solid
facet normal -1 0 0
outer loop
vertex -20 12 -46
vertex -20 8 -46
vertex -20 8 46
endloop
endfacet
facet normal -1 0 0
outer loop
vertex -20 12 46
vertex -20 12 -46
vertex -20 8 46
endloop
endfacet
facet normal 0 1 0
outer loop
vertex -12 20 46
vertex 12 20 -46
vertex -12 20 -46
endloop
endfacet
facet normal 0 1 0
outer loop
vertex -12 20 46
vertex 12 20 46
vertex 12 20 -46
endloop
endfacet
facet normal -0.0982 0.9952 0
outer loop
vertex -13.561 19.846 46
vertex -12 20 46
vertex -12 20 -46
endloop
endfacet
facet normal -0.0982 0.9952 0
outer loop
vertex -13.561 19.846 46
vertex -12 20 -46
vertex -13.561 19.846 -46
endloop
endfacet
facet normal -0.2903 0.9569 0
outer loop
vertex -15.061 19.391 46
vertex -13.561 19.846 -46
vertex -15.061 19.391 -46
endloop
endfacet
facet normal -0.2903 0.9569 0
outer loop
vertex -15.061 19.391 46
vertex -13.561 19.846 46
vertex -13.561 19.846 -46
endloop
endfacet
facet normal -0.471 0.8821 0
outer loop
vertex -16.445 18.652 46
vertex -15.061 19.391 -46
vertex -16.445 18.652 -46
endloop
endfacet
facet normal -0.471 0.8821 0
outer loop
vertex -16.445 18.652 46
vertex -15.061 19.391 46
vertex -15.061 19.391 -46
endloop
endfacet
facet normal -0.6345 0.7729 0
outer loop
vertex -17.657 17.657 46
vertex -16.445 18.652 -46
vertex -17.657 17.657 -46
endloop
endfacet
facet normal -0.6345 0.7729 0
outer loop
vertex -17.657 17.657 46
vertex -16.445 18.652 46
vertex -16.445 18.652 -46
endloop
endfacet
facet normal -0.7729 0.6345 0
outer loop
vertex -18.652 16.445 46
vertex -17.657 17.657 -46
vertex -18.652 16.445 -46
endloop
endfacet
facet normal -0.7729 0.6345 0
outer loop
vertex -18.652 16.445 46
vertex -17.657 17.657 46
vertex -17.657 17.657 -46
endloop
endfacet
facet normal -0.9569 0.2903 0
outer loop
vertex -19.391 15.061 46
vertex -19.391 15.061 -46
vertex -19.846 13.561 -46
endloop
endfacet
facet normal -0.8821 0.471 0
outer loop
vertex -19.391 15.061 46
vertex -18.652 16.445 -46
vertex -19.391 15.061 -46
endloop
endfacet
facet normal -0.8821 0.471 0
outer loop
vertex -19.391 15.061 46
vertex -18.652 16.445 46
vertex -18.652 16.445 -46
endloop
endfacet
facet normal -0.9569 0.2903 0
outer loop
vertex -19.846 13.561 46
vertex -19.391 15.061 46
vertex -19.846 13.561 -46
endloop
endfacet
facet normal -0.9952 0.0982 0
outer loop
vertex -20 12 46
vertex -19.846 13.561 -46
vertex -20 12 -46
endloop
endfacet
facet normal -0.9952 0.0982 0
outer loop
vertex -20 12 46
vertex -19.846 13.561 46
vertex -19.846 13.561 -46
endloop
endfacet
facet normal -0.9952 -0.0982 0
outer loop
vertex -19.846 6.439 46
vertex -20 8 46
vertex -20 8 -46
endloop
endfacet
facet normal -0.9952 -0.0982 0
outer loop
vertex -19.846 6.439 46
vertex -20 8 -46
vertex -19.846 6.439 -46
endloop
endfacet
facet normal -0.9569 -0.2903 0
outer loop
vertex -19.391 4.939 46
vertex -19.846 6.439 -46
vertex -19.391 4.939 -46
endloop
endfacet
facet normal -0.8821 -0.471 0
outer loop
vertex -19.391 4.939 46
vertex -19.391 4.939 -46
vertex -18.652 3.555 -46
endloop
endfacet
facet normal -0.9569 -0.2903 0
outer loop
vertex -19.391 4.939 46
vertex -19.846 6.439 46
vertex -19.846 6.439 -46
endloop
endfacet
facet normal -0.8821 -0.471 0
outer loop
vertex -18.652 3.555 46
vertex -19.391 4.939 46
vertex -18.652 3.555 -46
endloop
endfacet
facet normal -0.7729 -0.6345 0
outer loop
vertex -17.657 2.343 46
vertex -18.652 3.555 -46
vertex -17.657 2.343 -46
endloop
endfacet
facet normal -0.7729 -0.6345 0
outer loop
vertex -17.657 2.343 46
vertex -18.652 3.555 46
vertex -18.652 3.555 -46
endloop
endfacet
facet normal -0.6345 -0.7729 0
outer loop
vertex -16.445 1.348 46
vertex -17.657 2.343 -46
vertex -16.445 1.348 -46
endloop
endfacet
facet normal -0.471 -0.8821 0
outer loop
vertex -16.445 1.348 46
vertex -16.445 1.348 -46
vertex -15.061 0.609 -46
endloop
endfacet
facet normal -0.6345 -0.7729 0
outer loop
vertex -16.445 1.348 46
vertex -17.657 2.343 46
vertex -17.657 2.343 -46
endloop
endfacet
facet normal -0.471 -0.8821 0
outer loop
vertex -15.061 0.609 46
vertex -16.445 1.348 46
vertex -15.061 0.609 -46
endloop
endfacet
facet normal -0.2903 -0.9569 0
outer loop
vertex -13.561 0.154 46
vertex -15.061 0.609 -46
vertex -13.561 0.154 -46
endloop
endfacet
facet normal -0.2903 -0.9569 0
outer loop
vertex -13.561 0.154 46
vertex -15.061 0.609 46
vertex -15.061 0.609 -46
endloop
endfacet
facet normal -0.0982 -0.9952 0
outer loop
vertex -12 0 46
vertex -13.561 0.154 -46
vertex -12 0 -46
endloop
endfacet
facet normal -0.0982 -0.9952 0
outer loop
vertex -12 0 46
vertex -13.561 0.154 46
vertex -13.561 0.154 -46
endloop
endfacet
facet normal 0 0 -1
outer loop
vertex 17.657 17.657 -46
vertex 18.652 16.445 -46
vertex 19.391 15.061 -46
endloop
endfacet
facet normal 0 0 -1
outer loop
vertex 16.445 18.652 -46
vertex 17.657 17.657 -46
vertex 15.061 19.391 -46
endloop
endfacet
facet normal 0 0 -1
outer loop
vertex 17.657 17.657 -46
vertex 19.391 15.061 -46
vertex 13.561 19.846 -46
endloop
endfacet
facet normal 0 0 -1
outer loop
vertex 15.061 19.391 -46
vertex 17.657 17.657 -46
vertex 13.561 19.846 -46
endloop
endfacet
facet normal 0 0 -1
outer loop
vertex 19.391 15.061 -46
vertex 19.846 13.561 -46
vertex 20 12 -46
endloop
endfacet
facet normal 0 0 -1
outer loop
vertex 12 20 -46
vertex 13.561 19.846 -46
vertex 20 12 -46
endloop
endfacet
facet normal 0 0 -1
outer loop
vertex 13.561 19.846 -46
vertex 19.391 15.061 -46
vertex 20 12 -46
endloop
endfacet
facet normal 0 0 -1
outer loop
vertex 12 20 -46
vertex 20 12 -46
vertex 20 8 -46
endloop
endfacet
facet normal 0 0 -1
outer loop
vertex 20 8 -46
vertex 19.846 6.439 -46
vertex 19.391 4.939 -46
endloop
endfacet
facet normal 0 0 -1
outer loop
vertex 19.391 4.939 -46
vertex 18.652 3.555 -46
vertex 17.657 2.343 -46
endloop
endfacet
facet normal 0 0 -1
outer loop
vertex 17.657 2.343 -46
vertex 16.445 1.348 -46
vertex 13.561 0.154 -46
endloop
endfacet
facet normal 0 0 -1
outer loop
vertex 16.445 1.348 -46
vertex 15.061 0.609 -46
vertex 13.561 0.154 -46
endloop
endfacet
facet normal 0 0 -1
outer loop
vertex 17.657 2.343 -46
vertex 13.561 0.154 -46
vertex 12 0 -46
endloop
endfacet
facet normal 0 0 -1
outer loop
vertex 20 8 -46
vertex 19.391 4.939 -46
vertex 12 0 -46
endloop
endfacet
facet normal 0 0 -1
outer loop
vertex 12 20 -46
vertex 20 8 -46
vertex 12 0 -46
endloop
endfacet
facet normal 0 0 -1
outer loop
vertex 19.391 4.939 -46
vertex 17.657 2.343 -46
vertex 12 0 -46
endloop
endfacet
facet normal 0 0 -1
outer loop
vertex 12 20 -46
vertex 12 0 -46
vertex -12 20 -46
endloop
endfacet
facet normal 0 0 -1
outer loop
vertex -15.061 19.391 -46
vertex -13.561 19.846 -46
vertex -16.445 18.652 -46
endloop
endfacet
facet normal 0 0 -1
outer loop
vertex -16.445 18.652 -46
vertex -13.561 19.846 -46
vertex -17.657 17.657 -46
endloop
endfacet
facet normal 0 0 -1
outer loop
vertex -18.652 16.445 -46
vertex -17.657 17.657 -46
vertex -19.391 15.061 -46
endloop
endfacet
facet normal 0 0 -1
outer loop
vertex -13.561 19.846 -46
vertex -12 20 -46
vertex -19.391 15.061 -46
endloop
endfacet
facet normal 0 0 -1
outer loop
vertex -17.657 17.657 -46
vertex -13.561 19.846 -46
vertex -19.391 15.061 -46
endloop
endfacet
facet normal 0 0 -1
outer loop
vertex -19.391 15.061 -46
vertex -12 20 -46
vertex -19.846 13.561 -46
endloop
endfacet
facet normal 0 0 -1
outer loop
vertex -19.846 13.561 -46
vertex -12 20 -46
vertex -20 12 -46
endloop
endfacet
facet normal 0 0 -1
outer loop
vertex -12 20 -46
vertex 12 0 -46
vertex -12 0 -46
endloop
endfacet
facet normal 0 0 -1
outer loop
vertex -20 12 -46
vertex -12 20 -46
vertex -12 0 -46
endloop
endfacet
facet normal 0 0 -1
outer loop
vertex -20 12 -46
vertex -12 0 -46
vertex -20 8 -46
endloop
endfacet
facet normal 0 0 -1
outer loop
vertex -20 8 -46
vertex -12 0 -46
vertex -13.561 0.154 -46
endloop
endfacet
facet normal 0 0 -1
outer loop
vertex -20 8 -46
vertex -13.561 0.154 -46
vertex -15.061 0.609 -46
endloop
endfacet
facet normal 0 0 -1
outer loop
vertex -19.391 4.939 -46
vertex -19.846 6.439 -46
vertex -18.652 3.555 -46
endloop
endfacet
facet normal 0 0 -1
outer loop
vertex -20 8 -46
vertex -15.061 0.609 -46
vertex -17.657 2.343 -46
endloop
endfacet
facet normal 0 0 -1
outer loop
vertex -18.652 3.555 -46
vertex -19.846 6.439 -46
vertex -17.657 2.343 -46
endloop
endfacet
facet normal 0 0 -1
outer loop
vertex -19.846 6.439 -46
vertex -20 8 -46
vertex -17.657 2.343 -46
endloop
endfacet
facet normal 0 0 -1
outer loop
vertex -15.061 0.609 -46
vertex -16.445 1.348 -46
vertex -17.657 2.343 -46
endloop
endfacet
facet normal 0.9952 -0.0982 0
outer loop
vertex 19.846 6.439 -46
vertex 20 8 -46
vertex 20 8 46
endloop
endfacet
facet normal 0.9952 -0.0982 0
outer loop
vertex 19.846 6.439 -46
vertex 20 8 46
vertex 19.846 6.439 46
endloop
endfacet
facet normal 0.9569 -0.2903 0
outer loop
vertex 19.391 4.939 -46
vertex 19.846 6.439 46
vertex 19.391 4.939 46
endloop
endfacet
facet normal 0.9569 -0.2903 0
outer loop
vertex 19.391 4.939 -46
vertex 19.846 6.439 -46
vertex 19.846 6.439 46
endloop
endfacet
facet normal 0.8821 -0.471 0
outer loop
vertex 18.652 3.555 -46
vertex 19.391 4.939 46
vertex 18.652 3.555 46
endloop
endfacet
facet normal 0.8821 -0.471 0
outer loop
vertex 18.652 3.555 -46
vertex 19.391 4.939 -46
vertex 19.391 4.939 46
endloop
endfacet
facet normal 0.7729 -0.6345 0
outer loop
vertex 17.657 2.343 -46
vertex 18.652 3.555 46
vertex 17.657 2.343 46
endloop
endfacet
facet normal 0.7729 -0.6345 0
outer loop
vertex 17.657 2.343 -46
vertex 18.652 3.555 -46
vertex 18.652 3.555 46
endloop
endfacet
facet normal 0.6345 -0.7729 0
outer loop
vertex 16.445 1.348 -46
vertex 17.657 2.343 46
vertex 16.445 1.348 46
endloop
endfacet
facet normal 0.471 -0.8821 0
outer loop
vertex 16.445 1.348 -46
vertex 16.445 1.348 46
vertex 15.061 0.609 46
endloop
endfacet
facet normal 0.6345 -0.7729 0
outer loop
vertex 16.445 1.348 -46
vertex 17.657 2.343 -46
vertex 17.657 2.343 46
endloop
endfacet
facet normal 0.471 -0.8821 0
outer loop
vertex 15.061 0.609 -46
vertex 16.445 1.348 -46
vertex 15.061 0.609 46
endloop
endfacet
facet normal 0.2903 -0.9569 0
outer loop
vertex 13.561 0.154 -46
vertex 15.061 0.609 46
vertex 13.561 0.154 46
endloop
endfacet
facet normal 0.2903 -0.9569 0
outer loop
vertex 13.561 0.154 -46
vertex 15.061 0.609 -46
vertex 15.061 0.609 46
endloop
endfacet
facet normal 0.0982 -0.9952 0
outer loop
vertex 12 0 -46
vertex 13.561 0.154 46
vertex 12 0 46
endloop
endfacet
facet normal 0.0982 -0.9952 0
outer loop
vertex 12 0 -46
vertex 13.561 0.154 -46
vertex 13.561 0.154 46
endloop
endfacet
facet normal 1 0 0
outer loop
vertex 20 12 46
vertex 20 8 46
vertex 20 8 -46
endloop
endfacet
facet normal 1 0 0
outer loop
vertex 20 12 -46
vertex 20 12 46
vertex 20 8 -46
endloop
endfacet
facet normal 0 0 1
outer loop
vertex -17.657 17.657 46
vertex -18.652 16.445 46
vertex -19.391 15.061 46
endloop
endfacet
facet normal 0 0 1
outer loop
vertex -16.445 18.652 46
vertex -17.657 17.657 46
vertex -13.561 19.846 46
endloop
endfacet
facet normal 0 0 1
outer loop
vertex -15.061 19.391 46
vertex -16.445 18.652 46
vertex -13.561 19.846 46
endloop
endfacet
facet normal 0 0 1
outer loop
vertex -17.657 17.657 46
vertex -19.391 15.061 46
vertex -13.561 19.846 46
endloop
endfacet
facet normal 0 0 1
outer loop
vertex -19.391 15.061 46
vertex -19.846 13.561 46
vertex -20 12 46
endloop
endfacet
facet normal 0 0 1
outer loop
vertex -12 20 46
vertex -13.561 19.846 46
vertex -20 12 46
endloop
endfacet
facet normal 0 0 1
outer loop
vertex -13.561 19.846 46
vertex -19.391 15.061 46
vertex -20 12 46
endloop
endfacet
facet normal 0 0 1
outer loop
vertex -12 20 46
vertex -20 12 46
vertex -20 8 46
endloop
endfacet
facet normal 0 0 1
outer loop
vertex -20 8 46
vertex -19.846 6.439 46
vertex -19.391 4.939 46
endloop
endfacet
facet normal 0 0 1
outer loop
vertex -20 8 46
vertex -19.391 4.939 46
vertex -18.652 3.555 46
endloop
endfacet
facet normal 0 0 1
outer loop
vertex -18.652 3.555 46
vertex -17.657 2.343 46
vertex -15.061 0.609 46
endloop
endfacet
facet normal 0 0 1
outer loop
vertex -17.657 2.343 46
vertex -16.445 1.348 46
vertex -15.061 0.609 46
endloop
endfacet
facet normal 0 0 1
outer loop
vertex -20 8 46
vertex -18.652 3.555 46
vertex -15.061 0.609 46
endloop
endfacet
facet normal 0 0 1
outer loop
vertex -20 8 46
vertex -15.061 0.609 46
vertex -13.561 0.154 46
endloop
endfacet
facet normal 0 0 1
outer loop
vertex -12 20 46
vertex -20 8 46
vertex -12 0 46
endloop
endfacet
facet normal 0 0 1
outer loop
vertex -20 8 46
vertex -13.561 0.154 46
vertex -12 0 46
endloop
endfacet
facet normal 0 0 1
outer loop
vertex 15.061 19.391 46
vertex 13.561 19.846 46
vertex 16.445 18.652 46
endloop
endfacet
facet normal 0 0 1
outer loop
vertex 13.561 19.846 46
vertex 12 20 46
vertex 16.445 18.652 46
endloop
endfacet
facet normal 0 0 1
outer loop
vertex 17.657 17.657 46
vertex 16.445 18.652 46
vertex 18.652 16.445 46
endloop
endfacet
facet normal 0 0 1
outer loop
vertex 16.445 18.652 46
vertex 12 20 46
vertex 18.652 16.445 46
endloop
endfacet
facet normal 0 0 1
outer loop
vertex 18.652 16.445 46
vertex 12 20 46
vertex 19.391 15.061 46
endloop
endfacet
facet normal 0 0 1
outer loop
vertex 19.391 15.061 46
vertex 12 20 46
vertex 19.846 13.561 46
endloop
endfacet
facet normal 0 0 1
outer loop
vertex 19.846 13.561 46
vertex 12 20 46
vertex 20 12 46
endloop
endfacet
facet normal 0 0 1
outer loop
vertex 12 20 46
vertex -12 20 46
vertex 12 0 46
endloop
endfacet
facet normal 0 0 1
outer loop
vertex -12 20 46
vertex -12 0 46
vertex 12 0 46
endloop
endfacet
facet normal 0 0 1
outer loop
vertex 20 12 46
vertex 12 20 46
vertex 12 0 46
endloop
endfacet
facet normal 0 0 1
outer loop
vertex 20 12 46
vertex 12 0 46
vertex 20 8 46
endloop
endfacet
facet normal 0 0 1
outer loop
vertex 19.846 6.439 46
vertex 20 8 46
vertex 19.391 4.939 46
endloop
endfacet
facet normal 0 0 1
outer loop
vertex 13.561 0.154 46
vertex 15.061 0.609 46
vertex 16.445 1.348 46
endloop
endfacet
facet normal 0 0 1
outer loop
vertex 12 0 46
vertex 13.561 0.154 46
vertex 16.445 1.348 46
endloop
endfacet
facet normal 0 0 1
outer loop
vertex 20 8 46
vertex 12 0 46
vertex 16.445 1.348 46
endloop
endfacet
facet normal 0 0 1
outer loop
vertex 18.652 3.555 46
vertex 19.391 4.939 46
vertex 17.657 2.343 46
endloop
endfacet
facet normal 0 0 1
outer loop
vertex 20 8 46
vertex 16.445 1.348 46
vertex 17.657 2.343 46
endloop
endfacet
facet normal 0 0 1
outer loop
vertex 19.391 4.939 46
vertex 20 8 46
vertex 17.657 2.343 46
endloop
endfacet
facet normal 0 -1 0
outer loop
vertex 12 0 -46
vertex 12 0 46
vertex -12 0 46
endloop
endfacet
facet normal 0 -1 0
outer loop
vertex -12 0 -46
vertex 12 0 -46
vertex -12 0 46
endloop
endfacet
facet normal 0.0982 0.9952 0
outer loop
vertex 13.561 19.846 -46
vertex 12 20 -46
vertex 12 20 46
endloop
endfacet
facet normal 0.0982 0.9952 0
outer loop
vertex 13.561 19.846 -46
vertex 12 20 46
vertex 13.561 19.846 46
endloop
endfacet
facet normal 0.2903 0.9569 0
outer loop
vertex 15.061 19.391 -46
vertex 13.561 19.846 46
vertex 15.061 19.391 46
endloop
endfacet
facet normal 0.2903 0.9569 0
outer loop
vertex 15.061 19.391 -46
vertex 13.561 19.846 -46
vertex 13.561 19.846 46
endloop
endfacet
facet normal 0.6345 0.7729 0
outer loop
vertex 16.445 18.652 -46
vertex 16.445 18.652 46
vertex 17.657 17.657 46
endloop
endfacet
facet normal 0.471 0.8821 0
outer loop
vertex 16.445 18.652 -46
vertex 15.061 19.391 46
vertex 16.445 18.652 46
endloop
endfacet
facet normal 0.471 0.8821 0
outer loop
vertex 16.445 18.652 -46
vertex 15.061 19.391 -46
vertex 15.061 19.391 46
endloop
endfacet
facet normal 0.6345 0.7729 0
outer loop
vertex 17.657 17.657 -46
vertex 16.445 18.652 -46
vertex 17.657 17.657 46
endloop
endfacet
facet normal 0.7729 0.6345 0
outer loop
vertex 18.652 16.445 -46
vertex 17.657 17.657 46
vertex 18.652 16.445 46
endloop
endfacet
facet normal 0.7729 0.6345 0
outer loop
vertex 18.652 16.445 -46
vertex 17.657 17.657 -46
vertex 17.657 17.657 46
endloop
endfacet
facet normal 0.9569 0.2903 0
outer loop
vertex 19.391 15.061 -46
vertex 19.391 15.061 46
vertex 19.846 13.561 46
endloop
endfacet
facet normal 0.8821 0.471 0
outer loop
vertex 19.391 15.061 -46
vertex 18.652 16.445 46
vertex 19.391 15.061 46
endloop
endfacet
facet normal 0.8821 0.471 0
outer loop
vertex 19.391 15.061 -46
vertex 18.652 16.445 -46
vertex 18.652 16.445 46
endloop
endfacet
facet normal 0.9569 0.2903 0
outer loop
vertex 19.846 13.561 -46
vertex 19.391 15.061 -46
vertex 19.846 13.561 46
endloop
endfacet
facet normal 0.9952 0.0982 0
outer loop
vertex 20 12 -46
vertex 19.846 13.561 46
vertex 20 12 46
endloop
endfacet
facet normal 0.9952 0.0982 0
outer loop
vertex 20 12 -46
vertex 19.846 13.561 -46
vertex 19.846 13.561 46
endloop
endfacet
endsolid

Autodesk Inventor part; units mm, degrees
ref_plane "YZ Plane" through (0, 0, 0) normal (1, 0, 0) x (0, 1, 0)
ref_plane "XZ Plane" through (0, 0, 0) normal (0, 1, 0) x (-1, 0, 0)
ref_plane "XY Plane" through (0, 0, 0) normal (0, 0, 1) x (1, 0, 0)
sketch "Sketch1" plane through (0, 0, 0) normal (0, 1, 0) x (-1, 0, 0)
  line L0 (20, 46) -> (-20, 46)
  line L1 (-20, 46) -> (-20, -46)
  line L2 (-20, -46) -> (20, -46)
  line L3 (20, -46) -> (20, 46)
  line L4 (20, 46) -> (-20, -46)
  line L5 (20, -46) -> (-20, 46)
  point P0 (0, 0)
  point P1 (0, 0)
  dimension "d9" = 92
  dimension "d10" = 40
extrude "Extrusion1" add sketch "Sketch1" along normal blind 20
fillet "Fillet5" radius 8 4 edges at (20, 20, 0) (-20, 20, 0) (20, 0, 0) (-20, 0, 0)
properties part number "battery-model-group2"
